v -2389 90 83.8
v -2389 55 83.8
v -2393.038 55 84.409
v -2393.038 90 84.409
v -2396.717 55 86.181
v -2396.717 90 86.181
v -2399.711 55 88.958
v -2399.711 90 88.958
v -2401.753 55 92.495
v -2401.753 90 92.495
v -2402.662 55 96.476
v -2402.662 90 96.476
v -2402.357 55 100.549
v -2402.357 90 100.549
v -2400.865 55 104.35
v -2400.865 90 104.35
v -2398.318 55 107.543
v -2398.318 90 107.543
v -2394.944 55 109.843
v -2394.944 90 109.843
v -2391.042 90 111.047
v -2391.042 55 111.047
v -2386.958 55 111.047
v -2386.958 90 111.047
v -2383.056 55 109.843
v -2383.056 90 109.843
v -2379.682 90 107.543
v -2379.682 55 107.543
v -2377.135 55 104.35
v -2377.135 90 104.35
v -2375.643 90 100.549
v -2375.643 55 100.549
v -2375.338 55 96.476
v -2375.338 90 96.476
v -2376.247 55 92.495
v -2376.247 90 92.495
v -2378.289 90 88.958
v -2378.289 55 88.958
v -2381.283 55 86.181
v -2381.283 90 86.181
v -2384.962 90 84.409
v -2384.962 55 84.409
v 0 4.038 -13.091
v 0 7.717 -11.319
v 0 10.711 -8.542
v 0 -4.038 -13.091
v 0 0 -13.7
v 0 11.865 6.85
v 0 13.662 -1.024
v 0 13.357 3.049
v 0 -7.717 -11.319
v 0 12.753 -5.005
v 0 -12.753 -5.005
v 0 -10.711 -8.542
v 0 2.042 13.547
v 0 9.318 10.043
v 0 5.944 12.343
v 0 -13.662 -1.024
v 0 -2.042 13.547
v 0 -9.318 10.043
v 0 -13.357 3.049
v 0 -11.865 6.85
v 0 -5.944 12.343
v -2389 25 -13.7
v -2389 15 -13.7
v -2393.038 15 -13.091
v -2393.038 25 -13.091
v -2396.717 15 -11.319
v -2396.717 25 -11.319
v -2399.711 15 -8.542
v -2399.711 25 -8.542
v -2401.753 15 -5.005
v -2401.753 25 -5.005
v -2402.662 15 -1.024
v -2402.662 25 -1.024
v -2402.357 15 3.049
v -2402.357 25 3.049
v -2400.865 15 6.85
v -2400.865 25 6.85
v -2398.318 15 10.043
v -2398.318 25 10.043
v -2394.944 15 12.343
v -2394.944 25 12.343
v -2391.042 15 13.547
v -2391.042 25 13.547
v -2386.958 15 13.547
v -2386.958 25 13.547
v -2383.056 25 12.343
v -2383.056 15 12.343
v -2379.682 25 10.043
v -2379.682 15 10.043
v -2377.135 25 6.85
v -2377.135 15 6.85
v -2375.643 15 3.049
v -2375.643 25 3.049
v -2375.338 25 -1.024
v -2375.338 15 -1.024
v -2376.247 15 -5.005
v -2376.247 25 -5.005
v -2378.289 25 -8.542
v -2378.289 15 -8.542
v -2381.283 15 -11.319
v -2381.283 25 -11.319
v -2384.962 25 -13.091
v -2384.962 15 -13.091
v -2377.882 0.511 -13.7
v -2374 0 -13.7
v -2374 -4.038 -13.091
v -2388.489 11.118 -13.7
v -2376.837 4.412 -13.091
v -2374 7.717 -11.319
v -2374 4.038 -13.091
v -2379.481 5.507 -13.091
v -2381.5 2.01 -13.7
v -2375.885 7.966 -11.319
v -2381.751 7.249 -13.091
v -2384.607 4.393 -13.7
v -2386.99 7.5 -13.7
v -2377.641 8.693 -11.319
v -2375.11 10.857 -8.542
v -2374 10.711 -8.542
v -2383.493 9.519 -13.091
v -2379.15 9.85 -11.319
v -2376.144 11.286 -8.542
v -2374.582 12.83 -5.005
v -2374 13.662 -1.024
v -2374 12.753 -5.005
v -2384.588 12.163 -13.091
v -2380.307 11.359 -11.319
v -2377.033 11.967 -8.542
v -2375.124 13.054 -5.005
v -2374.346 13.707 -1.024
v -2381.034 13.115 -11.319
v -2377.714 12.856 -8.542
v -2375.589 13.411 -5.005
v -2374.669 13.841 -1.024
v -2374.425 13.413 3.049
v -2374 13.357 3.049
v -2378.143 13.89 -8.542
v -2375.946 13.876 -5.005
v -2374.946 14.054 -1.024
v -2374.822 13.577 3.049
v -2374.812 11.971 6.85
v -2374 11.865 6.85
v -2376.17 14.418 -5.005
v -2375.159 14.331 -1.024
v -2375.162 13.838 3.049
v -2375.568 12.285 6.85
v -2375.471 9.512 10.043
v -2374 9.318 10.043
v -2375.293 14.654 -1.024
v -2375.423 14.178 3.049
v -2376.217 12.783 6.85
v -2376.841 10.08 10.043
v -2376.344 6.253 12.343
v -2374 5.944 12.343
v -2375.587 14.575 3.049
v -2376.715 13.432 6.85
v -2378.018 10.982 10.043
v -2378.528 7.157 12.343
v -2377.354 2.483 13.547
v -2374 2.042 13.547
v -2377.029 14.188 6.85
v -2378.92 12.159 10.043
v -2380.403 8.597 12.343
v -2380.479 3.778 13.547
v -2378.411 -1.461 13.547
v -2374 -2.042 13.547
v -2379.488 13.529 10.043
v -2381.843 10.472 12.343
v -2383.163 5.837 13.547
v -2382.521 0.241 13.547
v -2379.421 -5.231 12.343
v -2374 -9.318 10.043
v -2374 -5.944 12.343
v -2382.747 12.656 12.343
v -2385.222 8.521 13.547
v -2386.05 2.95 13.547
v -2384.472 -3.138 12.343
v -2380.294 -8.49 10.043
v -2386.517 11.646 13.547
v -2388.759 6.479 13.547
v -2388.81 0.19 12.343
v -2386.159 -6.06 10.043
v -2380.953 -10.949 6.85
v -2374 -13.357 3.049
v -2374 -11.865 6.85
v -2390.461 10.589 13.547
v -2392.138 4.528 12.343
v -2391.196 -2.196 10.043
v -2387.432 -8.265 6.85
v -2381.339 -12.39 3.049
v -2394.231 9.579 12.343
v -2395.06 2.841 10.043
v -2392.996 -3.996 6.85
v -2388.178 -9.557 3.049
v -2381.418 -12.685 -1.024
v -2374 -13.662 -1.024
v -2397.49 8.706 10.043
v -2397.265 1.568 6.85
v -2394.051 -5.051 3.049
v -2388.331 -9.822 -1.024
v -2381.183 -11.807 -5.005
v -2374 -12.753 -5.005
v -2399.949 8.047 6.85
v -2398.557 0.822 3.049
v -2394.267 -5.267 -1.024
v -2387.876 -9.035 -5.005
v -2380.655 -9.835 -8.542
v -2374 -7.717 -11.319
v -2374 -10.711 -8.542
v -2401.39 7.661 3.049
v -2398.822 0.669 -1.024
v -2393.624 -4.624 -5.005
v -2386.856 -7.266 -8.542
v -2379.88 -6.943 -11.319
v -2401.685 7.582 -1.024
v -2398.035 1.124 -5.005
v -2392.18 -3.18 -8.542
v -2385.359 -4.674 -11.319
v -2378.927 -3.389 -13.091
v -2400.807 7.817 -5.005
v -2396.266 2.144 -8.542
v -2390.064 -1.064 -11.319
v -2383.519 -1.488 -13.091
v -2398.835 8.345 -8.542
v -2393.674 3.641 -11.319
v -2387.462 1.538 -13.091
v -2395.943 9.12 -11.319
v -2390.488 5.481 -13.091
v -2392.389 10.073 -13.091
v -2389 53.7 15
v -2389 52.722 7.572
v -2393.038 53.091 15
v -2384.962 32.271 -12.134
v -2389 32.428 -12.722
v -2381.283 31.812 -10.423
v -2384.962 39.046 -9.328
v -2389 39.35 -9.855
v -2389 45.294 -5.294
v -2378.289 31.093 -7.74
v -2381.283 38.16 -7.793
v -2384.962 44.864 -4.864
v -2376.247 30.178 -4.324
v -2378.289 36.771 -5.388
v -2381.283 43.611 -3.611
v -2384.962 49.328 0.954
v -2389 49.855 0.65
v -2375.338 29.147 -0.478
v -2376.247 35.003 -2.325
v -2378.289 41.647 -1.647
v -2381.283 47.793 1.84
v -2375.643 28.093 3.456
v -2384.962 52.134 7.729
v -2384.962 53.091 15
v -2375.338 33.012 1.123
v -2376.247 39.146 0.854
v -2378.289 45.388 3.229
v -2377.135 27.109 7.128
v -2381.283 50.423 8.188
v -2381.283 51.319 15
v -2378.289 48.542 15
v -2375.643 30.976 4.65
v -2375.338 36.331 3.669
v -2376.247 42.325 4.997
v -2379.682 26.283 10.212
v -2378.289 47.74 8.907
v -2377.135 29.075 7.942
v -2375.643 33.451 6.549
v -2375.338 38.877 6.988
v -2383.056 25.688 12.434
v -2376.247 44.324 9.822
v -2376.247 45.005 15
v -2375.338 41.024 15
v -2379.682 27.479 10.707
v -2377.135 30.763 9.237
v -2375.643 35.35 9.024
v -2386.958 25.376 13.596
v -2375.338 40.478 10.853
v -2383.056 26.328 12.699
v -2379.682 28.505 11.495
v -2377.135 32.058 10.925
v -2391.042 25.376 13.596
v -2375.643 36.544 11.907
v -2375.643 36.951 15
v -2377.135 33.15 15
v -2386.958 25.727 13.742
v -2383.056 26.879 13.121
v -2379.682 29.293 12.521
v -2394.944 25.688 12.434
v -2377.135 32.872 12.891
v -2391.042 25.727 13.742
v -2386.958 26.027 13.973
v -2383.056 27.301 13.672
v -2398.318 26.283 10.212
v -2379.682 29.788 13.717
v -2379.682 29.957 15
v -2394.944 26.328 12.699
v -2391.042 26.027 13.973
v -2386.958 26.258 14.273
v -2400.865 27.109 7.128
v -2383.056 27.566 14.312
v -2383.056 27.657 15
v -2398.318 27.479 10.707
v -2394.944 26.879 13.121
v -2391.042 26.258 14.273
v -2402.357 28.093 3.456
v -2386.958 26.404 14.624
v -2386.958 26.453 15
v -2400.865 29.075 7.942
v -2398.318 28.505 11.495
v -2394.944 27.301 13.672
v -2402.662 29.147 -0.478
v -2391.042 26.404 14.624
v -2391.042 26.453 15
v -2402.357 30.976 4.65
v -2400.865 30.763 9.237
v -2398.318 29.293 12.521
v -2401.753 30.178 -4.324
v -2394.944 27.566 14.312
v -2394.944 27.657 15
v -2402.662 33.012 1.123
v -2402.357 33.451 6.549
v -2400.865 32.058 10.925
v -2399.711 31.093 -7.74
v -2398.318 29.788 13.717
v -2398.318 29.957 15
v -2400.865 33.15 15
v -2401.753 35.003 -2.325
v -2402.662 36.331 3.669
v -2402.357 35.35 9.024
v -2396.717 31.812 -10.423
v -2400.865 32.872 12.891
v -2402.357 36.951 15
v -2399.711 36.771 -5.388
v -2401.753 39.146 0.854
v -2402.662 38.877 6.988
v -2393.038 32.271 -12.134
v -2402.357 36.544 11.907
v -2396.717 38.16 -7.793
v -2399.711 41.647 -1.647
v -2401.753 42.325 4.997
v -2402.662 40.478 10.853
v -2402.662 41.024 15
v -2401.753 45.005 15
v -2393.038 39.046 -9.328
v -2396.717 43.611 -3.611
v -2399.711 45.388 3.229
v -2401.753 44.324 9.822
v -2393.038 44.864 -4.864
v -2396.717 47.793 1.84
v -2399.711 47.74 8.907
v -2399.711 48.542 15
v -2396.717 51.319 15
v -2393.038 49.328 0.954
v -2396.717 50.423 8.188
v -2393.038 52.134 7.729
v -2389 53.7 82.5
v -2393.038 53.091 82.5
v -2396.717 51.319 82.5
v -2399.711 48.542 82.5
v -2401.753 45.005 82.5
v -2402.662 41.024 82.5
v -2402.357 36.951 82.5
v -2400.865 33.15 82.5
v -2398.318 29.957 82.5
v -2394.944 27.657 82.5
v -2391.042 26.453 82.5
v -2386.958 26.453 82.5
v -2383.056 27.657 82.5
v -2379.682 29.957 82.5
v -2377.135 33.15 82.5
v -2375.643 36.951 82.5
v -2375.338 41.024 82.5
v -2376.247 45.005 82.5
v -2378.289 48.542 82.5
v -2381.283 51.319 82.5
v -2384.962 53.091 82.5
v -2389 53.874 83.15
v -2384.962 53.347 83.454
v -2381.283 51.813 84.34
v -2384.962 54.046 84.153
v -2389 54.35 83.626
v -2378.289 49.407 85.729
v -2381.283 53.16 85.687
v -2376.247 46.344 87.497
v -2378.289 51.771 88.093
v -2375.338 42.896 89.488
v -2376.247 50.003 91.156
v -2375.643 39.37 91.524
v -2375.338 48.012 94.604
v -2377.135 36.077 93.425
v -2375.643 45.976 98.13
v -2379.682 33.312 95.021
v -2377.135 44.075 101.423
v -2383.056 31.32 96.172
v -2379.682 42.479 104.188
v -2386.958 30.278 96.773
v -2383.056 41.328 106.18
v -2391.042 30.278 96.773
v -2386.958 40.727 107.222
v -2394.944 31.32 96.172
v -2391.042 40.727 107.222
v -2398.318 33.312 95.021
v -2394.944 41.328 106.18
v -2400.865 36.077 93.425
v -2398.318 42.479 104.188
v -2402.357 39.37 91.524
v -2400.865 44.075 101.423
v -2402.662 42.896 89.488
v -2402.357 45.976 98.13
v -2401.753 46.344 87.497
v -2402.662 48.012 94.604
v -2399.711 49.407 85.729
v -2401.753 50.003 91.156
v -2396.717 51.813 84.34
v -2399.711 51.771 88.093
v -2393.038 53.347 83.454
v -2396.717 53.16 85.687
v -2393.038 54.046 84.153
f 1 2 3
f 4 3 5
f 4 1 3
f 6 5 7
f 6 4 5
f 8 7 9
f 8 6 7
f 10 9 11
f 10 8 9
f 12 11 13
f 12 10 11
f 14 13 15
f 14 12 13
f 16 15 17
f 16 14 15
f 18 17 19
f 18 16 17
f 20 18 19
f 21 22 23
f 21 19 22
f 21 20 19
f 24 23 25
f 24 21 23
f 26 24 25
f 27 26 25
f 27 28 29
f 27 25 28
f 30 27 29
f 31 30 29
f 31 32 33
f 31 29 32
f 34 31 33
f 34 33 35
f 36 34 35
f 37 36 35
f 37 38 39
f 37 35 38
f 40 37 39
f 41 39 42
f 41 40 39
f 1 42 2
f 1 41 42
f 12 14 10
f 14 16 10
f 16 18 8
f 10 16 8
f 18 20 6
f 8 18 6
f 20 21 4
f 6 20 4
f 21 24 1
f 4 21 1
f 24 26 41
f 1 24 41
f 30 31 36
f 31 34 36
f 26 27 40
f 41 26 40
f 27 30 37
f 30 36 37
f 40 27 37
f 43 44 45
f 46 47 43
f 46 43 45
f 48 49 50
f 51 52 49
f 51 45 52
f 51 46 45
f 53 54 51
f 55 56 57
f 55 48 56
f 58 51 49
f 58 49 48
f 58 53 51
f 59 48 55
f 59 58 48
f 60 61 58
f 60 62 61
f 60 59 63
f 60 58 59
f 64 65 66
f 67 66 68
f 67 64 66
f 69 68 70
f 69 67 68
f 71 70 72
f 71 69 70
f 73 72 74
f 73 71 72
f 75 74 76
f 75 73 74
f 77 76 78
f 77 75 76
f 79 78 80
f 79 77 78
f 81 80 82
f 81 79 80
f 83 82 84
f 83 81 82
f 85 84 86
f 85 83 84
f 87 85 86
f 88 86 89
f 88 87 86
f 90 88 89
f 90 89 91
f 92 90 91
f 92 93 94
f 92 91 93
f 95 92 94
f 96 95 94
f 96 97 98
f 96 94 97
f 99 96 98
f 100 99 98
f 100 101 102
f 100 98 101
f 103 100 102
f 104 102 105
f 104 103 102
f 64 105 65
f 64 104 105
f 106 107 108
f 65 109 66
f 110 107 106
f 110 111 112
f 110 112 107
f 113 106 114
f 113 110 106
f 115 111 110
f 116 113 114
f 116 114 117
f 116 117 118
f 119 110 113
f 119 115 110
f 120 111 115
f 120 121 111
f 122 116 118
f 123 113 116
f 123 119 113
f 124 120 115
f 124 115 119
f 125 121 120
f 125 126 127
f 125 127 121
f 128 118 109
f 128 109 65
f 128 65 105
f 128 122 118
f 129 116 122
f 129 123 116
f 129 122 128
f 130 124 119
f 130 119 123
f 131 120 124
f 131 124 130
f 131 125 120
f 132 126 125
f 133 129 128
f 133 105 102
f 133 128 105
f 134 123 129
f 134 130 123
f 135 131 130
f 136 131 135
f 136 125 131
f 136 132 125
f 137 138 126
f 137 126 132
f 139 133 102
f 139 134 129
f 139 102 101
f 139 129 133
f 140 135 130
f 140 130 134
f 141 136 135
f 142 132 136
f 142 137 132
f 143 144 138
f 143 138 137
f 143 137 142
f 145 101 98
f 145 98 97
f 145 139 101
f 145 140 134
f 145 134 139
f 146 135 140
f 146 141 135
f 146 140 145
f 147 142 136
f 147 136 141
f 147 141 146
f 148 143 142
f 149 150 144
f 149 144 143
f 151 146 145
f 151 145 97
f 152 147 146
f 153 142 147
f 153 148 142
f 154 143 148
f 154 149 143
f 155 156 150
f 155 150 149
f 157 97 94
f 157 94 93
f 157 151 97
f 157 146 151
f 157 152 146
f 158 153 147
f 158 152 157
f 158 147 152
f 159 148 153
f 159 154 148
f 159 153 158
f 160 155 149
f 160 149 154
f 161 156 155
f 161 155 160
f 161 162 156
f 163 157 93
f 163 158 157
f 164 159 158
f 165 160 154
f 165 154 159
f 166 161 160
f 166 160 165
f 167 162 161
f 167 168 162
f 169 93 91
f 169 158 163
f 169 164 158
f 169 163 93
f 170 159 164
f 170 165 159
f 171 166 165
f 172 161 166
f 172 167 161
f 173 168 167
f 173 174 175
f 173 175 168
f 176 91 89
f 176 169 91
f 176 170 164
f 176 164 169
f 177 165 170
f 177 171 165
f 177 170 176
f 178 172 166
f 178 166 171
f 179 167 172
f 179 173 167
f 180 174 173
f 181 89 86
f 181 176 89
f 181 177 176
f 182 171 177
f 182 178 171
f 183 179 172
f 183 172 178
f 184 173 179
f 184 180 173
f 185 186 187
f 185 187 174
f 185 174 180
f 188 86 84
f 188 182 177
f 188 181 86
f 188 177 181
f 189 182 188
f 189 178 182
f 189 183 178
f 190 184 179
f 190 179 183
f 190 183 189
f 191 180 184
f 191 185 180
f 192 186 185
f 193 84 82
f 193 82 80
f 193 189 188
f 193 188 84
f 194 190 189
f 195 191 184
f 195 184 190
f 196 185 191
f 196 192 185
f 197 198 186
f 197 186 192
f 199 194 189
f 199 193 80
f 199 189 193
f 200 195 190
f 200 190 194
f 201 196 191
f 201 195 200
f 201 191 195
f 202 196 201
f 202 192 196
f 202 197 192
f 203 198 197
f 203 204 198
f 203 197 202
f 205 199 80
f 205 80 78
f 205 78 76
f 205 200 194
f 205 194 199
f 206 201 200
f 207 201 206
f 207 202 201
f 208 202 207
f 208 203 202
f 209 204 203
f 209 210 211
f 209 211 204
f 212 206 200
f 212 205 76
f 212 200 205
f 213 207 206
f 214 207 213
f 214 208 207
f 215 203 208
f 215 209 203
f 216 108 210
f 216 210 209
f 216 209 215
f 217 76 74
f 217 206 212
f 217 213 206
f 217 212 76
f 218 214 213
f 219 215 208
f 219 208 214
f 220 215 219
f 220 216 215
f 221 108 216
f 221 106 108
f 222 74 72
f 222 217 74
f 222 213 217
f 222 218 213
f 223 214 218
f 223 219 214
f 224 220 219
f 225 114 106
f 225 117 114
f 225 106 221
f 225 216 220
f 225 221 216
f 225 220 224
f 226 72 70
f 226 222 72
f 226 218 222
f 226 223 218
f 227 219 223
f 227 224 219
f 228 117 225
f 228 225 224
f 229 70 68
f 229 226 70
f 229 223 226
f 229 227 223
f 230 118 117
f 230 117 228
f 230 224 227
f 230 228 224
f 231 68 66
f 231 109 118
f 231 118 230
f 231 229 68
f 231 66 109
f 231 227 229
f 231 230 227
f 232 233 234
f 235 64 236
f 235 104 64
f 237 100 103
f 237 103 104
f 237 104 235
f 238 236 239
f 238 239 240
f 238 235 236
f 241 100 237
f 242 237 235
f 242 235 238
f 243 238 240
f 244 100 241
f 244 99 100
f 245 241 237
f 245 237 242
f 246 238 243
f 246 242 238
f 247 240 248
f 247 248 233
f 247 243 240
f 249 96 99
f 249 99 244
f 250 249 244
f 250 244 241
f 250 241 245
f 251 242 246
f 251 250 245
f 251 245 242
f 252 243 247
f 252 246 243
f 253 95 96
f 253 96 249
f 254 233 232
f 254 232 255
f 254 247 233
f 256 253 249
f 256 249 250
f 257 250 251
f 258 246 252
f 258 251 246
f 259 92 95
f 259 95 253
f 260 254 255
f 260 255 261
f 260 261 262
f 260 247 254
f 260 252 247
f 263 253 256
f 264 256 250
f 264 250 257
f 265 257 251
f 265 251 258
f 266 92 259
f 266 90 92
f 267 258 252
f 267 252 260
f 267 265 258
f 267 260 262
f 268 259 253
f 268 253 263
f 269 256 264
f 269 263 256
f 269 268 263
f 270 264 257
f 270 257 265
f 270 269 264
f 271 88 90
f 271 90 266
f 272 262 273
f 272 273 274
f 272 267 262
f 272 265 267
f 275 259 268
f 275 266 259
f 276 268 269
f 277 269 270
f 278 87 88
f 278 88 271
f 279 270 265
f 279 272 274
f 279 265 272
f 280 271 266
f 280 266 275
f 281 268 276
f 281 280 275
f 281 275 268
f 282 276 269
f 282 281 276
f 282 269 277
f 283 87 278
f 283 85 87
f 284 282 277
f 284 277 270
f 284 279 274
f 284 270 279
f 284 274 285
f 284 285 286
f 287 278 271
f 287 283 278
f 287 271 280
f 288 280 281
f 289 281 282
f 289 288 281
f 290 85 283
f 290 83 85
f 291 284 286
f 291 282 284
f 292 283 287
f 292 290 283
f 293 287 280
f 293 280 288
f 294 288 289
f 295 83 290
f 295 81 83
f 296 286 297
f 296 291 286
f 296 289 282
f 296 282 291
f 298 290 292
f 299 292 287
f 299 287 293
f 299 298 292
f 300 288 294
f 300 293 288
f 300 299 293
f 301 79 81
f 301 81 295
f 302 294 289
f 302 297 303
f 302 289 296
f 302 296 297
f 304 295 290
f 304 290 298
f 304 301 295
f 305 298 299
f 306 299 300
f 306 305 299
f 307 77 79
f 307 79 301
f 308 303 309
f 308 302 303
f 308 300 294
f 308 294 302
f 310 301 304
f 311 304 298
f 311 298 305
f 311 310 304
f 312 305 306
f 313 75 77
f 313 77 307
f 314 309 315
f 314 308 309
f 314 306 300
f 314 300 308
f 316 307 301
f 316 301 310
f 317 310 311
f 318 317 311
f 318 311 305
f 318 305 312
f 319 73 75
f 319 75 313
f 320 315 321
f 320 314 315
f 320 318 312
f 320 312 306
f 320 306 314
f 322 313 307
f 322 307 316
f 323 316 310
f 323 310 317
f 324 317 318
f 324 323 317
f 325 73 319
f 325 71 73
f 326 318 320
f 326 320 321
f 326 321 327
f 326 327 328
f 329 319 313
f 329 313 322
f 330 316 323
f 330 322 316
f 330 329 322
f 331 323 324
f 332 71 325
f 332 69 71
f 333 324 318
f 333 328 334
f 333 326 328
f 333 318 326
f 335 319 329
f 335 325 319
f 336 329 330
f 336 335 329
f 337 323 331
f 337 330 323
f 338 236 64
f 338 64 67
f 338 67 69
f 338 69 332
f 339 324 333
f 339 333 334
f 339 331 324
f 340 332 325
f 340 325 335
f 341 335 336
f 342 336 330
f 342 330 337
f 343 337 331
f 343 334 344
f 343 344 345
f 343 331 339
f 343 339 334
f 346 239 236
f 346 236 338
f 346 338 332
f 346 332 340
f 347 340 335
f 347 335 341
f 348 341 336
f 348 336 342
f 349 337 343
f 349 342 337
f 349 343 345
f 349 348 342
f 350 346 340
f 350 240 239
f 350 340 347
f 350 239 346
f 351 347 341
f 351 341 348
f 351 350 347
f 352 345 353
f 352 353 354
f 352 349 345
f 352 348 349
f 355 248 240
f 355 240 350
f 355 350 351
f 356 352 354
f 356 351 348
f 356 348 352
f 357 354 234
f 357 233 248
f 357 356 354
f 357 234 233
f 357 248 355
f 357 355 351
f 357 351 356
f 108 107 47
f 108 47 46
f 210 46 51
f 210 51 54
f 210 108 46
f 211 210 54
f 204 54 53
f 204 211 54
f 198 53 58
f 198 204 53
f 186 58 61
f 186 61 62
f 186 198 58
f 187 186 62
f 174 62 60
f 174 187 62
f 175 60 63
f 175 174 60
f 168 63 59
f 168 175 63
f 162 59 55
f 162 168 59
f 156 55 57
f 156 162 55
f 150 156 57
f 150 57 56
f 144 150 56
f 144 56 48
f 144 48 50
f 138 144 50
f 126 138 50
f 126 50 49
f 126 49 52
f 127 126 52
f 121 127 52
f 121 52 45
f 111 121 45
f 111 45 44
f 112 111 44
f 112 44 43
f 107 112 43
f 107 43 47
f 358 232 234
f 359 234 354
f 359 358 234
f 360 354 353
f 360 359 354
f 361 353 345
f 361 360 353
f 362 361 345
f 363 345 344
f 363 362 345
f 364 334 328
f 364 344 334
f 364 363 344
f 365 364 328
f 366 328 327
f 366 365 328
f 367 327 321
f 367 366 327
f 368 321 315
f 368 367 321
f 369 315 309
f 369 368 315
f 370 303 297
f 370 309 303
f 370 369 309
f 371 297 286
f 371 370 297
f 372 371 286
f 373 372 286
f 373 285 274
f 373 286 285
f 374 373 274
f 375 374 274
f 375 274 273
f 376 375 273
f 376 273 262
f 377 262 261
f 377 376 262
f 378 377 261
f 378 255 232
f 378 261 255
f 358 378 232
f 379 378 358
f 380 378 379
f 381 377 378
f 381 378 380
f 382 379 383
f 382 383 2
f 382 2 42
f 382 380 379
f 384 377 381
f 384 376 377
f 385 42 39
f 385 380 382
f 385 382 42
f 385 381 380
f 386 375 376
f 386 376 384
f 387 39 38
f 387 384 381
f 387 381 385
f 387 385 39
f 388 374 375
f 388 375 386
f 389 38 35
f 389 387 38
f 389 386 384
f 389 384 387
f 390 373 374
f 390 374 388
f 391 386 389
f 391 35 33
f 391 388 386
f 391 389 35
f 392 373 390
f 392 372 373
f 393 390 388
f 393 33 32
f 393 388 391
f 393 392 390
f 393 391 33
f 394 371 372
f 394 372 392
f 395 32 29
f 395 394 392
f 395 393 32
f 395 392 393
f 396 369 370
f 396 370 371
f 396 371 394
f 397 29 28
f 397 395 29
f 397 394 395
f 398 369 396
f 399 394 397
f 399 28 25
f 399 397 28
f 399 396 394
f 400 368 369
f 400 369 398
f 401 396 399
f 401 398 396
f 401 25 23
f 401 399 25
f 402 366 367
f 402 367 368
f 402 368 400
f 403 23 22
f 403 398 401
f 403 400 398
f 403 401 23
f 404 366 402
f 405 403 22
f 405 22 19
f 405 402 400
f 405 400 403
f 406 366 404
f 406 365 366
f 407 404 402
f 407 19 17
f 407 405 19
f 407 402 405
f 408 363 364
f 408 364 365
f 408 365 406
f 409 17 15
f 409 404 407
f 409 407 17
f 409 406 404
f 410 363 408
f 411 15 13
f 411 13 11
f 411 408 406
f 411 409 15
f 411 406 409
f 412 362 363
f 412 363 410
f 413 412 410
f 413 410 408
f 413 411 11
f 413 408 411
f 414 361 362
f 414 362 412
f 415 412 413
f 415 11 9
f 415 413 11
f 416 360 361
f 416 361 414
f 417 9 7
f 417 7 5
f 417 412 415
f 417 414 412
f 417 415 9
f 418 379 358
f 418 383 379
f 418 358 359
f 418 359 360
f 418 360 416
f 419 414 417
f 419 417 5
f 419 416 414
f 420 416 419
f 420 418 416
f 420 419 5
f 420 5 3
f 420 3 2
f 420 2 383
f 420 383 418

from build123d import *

# Parameters (mm, degrees)
CROQUIS1_R = 13.7


with BuildPart() as part:
    # Barrer1: sweep along a curve in space
    with BuildLine() as barrer1_path:
        Line((0, 0, 0), (-2374, 0, 0))
        ThreePointArc((-2374, 0, 0), (-2384.606601718, 4.393398282, 0), (-2389, 15, 0))
        Line((-2389, 15, 0), (-2389, 25, 0))
        ThreePointArc((-2389, 25, 0), (-2389, 35.606601718, 4.393398282), (-2389, 40, 15))
        Line((-2389, 40, 15), (-2389, 40, 82.5))
        ThreePointArc((-2389, 40, 82.5), (-2389, 44.393398282, 93.106601718), (-2389, 55, 97.5))
        Line((-2389, 55, 97.5), (-2389, 90, 97.5))
    # Croquis1 → Barrer1 (sweep)
    with BuildSketch(Plane(origin=(0, 0, 0), x_dir=(0, 0, -1), z_dir=(1, 0, 0))):
        Circle(CROQUIS1_R)
    sweep(path=barrer1_path.line)


solid = part.part
